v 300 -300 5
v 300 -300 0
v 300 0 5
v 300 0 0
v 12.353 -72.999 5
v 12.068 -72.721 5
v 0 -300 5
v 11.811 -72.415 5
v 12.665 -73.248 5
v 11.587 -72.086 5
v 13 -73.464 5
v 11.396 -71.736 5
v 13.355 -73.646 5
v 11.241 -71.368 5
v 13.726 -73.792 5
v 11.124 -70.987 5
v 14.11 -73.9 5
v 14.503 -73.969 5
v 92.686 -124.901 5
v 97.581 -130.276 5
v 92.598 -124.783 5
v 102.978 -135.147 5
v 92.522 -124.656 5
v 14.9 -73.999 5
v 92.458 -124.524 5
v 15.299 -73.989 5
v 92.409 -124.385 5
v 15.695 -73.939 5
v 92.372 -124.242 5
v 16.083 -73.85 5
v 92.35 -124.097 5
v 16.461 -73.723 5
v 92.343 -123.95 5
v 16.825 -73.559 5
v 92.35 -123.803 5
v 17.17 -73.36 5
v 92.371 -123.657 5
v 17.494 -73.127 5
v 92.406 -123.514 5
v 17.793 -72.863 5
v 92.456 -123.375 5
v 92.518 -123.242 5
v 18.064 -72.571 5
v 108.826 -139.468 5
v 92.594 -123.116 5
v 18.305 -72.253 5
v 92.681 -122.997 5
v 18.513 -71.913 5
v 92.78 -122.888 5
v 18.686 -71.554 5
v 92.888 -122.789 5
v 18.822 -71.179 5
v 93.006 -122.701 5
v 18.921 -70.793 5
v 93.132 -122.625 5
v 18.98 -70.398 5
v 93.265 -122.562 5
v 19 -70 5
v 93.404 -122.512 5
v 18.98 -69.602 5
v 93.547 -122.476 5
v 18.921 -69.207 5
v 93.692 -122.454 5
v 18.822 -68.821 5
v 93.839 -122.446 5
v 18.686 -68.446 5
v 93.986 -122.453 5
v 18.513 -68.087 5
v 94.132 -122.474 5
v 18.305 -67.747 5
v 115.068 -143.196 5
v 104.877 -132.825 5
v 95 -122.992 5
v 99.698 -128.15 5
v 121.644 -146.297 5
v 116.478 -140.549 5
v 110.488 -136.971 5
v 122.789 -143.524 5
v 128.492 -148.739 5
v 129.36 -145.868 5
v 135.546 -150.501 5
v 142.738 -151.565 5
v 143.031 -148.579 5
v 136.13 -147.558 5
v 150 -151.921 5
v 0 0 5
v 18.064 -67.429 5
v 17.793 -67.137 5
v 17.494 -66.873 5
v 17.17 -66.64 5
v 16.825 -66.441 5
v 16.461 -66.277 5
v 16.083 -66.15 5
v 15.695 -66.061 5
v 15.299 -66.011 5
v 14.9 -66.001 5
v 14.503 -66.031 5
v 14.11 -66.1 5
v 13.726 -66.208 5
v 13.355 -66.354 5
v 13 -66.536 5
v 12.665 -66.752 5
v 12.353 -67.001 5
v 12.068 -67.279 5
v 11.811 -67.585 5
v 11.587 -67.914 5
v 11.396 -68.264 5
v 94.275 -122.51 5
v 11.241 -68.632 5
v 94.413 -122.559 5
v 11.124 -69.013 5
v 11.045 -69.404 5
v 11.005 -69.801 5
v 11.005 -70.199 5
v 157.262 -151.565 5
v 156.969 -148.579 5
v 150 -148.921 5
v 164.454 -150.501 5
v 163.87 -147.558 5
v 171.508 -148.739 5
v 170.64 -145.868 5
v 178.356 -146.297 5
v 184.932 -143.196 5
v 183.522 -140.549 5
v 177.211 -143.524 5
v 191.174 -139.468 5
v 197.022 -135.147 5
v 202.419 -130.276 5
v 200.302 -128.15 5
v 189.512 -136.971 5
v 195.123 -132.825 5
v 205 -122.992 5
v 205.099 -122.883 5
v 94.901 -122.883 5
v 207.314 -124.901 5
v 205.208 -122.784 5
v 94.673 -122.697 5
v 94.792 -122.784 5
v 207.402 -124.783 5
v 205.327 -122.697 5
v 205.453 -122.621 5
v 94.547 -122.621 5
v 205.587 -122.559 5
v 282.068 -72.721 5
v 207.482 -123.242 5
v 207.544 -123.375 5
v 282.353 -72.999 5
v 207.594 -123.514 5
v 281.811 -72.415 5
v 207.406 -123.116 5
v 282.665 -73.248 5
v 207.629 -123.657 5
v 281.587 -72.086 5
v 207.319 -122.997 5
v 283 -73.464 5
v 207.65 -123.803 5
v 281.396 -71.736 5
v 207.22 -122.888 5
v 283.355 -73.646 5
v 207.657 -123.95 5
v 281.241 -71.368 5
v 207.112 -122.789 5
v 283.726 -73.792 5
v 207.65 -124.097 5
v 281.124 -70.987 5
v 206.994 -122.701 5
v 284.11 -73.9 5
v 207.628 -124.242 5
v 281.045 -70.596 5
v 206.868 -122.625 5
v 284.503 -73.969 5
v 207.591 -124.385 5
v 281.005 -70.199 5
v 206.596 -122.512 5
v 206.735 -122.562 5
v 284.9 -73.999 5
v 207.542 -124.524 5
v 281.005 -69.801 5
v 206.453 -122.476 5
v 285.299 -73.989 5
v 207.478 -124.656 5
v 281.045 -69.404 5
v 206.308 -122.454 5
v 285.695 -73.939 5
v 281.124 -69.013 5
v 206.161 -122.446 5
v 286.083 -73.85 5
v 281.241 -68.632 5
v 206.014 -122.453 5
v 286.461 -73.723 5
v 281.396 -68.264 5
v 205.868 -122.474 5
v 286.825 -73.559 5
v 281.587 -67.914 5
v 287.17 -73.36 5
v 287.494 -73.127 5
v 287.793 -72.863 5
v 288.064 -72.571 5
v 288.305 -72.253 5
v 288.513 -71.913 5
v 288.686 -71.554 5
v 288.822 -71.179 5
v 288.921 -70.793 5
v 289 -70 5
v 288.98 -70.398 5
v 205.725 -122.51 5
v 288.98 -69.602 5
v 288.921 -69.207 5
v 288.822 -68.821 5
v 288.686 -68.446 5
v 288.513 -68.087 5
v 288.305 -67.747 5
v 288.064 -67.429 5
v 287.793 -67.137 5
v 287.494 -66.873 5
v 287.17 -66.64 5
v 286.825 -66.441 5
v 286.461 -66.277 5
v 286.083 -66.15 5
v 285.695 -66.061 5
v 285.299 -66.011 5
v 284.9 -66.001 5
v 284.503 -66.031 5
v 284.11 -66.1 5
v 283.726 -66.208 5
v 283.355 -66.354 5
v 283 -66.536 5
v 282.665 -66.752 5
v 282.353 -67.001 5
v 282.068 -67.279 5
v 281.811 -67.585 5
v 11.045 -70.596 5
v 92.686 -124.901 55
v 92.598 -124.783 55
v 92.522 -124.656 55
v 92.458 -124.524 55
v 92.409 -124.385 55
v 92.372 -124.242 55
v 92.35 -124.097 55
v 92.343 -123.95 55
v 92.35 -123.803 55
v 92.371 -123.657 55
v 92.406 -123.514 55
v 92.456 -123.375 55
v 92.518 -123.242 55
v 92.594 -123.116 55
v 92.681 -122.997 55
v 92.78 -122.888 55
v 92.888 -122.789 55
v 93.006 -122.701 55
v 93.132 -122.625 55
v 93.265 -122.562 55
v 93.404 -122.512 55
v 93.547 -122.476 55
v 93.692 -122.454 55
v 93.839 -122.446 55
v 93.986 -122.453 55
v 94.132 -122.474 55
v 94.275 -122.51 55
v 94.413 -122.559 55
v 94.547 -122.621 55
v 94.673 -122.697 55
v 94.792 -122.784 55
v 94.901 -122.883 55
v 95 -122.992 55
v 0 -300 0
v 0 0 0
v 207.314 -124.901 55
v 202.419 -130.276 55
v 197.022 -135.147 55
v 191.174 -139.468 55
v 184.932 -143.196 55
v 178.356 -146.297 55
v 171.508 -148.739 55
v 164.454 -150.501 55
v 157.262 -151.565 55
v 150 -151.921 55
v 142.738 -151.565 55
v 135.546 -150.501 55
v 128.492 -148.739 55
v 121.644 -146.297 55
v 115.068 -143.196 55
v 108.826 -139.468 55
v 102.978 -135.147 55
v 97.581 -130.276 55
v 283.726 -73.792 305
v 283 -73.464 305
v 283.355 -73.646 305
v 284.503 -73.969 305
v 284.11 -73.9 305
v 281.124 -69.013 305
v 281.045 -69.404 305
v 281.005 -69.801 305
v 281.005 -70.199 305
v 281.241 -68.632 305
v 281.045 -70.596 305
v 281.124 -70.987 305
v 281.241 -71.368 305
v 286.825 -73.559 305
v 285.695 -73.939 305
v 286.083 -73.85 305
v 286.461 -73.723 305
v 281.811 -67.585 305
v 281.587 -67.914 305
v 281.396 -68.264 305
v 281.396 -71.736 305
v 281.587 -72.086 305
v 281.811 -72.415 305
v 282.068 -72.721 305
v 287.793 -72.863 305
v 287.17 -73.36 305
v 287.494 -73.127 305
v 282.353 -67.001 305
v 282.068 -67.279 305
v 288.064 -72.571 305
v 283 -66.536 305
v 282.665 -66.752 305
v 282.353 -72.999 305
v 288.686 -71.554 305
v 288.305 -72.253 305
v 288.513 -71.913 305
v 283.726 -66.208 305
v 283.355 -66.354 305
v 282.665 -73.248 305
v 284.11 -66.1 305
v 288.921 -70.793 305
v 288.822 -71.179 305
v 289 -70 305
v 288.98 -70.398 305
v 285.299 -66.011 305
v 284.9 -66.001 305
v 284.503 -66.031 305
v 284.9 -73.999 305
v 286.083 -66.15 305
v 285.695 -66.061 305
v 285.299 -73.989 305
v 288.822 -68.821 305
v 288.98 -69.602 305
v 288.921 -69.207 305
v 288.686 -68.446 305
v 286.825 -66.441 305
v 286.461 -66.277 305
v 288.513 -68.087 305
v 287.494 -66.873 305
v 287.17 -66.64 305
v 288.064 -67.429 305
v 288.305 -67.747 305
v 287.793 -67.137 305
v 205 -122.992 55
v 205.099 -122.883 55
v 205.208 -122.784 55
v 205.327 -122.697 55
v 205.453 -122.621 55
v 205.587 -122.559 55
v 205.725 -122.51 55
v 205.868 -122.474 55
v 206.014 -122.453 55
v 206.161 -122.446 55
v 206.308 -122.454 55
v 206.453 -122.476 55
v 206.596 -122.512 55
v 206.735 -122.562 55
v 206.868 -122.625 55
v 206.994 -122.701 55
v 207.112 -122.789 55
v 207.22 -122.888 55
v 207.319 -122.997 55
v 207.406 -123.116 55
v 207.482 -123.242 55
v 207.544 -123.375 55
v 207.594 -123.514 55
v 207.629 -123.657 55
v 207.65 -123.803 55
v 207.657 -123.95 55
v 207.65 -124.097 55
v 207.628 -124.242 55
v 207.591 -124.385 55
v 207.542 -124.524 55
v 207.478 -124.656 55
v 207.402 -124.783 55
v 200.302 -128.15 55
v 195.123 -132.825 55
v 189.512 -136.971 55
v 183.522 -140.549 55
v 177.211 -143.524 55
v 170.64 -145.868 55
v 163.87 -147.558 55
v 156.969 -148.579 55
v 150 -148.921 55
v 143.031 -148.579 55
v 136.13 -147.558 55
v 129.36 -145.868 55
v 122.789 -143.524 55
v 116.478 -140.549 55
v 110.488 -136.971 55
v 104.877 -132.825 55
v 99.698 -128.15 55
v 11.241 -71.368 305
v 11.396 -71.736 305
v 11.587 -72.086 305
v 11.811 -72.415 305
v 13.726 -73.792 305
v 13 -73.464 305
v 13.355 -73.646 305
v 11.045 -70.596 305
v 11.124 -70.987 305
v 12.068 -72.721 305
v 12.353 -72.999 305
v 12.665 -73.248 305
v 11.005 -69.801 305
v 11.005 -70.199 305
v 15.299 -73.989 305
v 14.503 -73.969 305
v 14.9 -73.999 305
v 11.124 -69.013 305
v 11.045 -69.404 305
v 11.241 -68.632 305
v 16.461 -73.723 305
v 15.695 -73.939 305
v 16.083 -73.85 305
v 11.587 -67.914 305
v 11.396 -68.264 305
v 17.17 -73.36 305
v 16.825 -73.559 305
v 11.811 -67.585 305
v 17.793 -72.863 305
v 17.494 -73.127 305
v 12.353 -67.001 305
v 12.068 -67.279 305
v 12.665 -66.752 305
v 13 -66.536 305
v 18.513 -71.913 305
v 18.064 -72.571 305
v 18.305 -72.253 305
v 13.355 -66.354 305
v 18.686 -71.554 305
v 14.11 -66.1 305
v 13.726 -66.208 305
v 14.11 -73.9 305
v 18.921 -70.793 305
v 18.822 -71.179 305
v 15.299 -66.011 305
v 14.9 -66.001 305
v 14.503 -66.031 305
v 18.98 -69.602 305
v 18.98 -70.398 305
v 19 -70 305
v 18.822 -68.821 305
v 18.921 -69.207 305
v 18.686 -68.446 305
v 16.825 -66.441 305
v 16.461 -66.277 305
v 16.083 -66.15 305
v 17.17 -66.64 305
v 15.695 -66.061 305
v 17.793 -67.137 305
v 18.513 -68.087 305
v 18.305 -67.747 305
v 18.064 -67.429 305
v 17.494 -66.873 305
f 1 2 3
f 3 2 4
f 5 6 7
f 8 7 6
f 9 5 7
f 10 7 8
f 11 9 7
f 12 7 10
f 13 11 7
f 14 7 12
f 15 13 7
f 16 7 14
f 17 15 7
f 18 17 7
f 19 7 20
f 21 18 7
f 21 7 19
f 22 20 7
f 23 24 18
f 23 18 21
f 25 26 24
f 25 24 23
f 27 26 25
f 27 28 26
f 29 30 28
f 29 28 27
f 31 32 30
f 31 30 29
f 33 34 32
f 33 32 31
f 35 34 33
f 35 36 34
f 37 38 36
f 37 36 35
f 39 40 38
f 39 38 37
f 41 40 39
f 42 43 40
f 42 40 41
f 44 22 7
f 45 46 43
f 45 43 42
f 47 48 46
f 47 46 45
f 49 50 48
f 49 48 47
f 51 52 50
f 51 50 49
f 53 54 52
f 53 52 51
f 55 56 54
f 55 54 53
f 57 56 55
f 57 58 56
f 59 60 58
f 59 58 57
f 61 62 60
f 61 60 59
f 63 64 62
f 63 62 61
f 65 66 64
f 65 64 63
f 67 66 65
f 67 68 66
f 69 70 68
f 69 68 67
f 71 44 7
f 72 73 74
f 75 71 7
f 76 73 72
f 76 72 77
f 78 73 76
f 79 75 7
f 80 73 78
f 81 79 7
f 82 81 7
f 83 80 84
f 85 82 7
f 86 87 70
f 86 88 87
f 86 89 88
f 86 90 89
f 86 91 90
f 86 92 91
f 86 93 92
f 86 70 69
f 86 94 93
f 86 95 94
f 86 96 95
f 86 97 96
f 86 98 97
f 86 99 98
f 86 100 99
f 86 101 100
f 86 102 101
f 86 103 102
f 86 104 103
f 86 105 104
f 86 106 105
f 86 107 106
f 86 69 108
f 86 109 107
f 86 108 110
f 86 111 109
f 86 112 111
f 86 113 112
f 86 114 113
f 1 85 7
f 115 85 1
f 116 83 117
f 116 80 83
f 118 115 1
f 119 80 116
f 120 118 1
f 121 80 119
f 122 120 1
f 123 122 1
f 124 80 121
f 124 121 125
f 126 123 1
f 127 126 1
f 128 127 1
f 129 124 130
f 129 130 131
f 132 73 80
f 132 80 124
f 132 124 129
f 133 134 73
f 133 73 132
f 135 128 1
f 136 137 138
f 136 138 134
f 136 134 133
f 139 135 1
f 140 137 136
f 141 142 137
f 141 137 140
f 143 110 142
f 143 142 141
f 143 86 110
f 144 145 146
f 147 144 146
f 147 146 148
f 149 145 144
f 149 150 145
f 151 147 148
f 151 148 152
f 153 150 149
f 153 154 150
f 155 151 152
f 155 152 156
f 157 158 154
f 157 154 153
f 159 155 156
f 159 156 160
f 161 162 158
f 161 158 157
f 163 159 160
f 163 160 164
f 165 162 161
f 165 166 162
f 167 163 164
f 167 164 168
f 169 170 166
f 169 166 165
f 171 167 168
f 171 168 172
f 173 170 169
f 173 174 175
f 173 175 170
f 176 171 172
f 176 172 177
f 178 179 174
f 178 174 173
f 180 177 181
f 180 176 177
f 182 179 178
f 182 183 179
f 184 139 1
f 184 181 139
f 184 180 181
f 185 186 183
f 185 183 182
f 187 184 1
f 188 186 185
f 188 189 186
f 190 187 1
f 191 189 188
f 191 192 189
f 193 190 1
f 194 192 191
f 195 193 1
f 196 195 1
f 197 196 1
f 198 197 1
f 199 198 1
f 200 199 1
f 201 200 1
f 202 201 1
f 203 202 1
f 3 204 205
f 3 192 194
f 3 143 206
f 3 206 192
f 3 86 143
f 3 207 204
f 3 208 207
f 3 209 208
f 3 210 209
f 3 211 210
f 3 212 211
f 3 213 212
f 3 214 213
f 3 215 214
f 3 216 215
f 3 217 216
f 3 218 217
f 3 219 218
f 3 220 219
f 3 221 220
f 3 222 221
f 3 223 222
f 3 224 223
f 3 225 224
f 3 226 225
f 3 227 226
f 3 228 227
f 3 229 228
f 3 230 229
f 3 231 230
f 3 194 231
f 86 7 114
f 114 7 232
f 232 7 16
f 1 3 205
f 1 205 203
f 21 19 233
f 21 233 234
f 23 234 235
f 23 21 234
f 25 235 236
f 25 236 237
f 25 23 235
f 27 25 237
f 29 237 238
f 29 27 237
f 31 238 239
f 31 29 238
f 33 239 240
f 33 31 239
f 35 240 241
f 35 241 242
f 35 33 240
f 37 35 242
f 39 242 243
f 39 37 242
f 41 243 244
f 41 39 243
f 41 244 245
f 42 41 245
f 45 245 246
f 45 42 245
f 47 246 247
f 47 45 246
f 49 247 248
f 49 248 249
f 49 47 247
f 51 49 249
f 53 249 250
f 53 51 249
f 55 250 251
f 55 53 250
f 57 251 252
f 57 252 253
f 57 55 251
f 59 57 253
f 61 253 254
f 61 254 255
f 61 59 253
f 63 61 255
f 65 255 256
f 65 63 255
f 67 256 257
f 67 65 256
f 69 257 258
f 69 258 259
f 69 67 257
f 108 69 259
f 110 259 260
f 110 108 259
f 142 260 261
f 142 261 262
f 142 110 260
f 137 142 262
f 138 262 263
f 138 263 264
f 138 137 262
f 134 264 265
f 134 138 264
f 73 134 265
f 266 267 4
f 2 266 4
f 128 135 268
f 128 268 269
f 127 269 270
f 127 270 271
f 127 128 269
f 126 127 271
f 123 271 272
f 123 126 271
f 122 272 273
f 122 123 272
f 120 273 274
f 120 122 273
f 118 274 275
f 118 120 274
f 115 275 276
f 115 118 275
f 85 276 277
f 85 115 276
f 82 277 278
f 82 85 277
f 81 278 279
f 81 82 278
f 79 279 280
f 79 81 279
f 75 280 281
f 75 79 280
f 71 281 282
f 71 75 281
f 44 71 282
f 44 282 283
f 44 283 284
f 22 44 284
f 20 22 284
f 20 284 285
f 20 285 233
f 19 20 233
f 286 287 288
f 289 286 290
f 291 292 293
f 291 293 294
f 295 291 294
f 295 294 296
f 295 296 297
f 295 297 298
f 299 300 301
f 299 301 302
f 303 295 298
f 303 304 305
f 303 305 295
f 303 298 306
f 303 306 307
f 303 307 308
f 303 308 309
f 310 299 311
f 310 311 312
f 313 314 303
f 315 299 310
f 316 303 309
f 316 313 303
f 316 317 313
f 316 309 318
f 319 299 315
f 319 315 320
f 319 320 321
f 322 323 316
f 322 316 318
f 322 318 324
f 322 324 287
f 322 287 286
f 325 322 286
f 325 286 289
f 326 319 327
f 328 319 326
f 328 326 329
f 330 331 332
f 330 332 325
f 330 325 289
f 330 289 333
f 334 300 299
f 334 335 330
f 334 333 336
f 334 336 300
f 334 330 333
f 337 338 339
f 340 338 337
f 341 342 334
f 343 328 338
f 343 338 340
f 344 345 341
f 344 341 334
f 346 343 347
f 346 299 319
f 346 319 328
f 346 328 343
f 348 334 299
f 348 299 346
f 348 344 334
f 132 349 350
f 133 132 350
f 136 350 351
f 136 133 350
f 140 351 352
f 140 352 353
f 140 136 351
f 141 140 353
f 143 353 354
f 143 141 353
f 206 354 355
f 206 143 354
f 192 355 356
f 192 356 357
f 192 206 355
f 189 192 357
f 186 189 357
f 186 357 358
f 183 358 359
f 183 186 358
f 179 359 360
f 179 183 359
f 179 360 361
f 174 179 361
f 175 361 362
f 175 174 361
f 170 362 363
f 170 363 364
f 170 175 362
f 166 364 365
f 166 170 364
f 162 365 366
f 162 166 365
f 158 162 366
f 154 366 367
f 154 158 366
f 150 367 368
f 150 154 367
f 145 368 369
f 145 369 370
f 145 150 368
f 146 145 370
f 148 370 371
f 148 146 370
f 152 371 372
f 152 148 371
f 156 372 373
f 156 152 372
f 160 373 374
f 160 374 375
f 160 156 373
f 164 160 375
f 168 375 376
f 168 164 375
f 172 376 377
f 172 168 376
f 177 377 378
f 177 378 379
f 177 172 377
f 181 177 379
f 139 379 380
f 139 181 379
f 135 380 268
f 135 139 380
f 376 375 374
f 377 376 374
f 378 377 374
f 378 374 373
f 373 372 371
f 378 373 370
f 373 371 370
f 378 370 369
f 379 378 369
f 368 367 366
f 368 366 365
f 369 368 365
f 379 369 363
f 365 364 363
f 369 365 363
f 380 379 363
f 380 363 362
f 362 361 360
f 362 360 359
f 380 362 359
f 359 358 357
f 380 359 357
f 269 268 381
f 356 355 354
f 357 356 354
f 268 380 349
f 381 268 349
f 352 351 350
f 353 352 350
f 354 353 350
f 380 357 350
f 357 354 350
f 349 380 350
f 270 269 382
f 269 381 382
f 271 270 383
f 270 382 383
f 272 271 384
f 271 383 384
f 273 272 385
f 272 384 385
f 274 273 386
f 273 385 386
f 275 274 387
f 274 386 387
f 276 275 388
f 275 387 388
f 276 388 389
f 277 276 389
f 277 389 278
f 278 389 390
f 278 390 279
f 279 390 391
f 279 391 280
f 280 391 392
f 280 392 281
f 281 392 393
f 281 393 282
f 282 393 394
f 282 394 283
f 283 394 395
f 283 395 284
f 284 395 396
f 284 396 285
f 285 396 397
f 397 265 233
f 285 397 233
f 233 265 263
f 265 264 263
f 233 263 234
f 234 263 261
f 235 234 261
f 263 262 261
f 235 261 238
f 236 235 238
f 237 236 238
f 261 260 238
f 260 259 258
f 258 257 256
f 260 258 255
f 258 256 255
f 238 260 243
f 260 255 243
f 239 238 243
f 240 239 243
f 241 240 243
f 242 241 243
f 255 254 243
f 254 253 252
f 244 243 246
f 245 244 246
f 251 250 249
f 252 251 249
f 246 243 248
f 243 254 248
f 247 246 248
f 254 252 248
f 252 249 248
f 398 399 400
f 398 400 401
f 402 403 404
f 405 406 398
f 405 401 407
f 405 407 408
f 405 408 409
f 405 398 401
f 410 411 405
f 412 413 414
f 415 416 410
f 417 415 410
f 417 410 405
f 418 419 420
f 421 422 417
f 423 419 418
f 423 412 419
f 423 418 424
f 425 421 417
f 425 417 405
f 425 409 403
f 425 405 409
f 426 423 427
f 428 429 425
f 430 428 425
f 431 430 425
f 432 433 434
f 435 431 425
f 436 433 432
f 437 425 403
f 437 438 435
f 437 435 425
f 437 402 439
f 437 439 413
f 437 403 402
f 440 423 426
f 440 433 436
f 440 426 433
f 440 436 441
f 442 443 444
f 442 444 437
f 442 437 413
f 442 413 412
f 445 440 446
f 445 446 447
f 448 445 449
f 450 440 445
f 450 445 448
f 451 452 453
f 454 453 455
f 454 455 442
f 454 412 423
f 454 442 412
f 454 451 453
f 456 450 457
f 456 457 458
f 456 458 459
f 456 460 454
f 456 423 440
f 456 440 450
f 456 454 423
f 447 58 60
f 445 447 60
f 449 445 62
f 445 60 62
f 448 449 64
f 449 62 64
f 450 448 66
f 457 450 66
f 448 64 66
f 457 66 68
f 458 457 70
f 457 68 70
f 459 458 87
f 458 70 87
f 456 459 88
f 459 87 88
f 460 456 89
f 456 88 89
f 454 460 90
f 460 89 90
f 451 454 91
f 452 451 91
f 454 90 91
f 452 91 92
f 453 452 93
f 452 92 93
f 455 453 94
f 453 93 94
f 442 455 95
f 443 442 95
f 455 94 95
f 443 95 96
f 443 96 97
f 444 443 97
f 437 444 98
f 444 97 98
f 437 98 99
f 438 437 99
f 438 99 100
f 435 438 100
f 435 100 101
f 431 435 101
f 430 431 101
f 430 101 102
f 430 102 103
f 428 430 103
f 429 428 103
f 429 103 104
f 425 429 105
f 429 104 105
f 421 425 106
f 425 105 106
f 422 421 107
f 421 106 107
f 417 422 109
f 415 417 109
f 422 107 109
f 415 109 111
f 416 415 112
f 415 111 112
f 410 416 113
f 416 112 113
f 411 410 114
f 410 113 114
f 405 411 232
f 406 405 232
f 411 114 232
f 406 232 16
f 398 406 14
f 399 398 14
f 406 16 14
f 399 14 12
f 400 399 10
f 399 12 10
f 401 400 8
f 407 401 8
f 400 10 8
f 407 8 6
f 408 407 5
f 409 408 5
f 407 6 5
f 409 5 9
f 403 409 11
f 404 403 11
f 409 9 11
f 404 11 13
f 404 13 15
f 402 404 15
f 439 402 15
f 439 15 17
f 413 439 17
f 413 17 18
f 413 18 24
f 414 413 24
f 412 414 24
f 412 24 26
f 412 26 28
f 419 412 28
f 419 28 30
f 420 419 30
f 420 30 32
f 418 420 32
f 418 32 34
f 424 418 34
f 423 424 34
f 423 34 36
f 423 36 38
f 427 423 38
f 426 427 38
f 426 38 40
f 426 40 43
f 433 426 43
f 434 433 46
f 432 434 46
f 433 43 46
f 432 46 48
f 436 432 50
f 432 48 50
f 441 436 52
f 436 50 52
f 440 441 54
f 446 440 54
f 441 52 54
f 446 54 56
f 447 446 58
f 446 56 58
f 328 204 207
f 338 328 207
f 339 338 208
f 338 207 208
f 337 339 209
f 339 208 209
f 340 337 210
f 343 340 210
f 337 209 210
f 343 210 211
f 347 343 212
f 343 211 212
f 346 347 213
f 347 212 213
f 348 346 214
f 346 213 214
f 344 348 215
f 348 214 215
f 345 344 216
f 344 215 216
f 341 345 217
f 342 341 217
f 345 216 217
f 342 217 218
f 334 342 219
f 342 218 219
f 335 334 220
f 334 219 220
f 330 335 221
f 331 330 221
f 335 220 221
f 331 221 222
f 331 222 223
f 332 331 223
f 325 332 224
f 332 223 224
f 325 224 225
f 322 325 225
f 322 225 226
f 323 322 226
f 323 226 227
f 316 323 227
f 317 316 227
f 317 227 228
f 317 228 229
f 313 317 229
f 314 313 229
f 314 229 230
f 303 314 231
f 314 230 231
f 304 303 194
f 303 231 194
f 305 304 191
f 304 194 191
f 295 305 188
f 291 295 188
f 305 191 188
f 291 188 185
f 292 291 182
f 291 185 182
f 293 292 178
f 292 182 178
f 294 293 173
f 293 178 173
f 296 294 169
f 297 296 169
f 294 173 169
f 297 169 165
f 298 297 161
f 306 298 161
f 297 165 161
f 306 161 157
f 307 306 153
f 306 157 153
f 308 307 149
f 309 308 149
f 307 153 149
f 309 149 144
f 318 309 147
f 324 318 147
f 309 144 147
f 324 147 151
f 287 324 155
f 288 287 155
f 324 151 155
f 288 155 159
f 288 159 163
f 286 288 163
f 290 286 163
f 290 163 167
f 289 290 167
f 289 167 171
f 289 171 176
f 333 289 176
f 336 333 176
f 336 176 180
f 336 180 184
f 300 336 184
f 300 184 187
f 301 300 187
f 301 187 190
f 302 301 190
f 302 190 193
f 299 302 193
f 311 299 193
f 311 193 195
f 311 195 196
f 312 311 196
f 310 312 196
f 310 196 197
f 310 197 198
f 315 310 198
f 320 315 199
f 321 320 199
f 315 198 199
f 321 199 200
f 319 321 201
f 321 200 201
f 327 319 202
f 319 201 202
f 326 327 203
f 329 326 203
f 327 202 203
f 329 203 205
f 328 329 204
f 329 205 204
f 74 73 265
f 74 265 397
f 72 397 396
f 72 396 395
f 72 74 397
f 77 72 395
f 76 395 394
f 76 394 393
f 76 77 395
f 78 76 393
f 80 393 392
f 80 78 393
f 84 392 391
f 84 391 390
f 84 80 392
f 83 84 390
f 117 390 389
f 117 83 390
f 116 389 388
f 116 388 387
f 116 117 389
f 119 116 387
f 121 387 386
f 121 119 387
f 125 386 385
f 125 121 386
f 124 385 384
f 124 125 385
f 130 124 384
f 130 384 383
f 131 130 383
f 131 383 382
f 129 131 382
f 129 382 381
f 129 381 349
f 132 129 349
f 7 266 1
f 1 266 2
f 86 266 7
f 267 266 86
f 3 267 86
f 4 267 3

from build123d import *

# Parameters (mm, degrees)
ESQUISSE1_W        = 300
ESQUISSE1_H        = 300
BOSS_EXTRU_1_DEPTH = 5
ESQUISSE2_R        = 4
BOSS_EXTRU_2_DEPTH = 300
BOSS_EXTRU_4_DEPTH = 50


with BuildPart() as part:
    # Esquisse1 → Boss.-Extru.1 (new body)
    with BuildSketch(Plane.XY):
        with Locations((150, -150)):
            Rectangle(ESQUISSE1_W, ESQUISSE1_H)
    extrude(amount=BOSS_EXTRU_1_DEPTH)

    # Esquisse2 → Boss.-Extru.2 (add)
    with BuildSketch(Plane.XY.offset(5)):
        with Locations((15, -70)):
            Circle(ESQUISSE2_R)
        with Locations((285, -70)):
            Circle(ESQUISSE2_R)
    extrude(amount=BOSS_EXTRU_2_DEPTH)

    # Esquisse5 → Boss.-Extru.4 (add)
    with BuildSketch(Plane.XY.offset(5)):
        with BuildLine():
            ThreePointArc((95, -122.991547009), (150, -148.920572223), (205, -122.991547009))
            ThreePointArc((205, -122.991547009), (207.11161857, -122.788897028), (207.314268551, -124.900515598))
            ThreePointArc((207.314268551, -124.900515598), (150, -151.920572223), (92.685731449, -124.900515598))
            ThreePointArc((92.685731449, -124.900515598), (92.88838143, -122.788897028), (95, -122.991547009))
        make_face()
    extrude(amount=BOSS_EXTRU_4_DEPTH)


solid = part.part
